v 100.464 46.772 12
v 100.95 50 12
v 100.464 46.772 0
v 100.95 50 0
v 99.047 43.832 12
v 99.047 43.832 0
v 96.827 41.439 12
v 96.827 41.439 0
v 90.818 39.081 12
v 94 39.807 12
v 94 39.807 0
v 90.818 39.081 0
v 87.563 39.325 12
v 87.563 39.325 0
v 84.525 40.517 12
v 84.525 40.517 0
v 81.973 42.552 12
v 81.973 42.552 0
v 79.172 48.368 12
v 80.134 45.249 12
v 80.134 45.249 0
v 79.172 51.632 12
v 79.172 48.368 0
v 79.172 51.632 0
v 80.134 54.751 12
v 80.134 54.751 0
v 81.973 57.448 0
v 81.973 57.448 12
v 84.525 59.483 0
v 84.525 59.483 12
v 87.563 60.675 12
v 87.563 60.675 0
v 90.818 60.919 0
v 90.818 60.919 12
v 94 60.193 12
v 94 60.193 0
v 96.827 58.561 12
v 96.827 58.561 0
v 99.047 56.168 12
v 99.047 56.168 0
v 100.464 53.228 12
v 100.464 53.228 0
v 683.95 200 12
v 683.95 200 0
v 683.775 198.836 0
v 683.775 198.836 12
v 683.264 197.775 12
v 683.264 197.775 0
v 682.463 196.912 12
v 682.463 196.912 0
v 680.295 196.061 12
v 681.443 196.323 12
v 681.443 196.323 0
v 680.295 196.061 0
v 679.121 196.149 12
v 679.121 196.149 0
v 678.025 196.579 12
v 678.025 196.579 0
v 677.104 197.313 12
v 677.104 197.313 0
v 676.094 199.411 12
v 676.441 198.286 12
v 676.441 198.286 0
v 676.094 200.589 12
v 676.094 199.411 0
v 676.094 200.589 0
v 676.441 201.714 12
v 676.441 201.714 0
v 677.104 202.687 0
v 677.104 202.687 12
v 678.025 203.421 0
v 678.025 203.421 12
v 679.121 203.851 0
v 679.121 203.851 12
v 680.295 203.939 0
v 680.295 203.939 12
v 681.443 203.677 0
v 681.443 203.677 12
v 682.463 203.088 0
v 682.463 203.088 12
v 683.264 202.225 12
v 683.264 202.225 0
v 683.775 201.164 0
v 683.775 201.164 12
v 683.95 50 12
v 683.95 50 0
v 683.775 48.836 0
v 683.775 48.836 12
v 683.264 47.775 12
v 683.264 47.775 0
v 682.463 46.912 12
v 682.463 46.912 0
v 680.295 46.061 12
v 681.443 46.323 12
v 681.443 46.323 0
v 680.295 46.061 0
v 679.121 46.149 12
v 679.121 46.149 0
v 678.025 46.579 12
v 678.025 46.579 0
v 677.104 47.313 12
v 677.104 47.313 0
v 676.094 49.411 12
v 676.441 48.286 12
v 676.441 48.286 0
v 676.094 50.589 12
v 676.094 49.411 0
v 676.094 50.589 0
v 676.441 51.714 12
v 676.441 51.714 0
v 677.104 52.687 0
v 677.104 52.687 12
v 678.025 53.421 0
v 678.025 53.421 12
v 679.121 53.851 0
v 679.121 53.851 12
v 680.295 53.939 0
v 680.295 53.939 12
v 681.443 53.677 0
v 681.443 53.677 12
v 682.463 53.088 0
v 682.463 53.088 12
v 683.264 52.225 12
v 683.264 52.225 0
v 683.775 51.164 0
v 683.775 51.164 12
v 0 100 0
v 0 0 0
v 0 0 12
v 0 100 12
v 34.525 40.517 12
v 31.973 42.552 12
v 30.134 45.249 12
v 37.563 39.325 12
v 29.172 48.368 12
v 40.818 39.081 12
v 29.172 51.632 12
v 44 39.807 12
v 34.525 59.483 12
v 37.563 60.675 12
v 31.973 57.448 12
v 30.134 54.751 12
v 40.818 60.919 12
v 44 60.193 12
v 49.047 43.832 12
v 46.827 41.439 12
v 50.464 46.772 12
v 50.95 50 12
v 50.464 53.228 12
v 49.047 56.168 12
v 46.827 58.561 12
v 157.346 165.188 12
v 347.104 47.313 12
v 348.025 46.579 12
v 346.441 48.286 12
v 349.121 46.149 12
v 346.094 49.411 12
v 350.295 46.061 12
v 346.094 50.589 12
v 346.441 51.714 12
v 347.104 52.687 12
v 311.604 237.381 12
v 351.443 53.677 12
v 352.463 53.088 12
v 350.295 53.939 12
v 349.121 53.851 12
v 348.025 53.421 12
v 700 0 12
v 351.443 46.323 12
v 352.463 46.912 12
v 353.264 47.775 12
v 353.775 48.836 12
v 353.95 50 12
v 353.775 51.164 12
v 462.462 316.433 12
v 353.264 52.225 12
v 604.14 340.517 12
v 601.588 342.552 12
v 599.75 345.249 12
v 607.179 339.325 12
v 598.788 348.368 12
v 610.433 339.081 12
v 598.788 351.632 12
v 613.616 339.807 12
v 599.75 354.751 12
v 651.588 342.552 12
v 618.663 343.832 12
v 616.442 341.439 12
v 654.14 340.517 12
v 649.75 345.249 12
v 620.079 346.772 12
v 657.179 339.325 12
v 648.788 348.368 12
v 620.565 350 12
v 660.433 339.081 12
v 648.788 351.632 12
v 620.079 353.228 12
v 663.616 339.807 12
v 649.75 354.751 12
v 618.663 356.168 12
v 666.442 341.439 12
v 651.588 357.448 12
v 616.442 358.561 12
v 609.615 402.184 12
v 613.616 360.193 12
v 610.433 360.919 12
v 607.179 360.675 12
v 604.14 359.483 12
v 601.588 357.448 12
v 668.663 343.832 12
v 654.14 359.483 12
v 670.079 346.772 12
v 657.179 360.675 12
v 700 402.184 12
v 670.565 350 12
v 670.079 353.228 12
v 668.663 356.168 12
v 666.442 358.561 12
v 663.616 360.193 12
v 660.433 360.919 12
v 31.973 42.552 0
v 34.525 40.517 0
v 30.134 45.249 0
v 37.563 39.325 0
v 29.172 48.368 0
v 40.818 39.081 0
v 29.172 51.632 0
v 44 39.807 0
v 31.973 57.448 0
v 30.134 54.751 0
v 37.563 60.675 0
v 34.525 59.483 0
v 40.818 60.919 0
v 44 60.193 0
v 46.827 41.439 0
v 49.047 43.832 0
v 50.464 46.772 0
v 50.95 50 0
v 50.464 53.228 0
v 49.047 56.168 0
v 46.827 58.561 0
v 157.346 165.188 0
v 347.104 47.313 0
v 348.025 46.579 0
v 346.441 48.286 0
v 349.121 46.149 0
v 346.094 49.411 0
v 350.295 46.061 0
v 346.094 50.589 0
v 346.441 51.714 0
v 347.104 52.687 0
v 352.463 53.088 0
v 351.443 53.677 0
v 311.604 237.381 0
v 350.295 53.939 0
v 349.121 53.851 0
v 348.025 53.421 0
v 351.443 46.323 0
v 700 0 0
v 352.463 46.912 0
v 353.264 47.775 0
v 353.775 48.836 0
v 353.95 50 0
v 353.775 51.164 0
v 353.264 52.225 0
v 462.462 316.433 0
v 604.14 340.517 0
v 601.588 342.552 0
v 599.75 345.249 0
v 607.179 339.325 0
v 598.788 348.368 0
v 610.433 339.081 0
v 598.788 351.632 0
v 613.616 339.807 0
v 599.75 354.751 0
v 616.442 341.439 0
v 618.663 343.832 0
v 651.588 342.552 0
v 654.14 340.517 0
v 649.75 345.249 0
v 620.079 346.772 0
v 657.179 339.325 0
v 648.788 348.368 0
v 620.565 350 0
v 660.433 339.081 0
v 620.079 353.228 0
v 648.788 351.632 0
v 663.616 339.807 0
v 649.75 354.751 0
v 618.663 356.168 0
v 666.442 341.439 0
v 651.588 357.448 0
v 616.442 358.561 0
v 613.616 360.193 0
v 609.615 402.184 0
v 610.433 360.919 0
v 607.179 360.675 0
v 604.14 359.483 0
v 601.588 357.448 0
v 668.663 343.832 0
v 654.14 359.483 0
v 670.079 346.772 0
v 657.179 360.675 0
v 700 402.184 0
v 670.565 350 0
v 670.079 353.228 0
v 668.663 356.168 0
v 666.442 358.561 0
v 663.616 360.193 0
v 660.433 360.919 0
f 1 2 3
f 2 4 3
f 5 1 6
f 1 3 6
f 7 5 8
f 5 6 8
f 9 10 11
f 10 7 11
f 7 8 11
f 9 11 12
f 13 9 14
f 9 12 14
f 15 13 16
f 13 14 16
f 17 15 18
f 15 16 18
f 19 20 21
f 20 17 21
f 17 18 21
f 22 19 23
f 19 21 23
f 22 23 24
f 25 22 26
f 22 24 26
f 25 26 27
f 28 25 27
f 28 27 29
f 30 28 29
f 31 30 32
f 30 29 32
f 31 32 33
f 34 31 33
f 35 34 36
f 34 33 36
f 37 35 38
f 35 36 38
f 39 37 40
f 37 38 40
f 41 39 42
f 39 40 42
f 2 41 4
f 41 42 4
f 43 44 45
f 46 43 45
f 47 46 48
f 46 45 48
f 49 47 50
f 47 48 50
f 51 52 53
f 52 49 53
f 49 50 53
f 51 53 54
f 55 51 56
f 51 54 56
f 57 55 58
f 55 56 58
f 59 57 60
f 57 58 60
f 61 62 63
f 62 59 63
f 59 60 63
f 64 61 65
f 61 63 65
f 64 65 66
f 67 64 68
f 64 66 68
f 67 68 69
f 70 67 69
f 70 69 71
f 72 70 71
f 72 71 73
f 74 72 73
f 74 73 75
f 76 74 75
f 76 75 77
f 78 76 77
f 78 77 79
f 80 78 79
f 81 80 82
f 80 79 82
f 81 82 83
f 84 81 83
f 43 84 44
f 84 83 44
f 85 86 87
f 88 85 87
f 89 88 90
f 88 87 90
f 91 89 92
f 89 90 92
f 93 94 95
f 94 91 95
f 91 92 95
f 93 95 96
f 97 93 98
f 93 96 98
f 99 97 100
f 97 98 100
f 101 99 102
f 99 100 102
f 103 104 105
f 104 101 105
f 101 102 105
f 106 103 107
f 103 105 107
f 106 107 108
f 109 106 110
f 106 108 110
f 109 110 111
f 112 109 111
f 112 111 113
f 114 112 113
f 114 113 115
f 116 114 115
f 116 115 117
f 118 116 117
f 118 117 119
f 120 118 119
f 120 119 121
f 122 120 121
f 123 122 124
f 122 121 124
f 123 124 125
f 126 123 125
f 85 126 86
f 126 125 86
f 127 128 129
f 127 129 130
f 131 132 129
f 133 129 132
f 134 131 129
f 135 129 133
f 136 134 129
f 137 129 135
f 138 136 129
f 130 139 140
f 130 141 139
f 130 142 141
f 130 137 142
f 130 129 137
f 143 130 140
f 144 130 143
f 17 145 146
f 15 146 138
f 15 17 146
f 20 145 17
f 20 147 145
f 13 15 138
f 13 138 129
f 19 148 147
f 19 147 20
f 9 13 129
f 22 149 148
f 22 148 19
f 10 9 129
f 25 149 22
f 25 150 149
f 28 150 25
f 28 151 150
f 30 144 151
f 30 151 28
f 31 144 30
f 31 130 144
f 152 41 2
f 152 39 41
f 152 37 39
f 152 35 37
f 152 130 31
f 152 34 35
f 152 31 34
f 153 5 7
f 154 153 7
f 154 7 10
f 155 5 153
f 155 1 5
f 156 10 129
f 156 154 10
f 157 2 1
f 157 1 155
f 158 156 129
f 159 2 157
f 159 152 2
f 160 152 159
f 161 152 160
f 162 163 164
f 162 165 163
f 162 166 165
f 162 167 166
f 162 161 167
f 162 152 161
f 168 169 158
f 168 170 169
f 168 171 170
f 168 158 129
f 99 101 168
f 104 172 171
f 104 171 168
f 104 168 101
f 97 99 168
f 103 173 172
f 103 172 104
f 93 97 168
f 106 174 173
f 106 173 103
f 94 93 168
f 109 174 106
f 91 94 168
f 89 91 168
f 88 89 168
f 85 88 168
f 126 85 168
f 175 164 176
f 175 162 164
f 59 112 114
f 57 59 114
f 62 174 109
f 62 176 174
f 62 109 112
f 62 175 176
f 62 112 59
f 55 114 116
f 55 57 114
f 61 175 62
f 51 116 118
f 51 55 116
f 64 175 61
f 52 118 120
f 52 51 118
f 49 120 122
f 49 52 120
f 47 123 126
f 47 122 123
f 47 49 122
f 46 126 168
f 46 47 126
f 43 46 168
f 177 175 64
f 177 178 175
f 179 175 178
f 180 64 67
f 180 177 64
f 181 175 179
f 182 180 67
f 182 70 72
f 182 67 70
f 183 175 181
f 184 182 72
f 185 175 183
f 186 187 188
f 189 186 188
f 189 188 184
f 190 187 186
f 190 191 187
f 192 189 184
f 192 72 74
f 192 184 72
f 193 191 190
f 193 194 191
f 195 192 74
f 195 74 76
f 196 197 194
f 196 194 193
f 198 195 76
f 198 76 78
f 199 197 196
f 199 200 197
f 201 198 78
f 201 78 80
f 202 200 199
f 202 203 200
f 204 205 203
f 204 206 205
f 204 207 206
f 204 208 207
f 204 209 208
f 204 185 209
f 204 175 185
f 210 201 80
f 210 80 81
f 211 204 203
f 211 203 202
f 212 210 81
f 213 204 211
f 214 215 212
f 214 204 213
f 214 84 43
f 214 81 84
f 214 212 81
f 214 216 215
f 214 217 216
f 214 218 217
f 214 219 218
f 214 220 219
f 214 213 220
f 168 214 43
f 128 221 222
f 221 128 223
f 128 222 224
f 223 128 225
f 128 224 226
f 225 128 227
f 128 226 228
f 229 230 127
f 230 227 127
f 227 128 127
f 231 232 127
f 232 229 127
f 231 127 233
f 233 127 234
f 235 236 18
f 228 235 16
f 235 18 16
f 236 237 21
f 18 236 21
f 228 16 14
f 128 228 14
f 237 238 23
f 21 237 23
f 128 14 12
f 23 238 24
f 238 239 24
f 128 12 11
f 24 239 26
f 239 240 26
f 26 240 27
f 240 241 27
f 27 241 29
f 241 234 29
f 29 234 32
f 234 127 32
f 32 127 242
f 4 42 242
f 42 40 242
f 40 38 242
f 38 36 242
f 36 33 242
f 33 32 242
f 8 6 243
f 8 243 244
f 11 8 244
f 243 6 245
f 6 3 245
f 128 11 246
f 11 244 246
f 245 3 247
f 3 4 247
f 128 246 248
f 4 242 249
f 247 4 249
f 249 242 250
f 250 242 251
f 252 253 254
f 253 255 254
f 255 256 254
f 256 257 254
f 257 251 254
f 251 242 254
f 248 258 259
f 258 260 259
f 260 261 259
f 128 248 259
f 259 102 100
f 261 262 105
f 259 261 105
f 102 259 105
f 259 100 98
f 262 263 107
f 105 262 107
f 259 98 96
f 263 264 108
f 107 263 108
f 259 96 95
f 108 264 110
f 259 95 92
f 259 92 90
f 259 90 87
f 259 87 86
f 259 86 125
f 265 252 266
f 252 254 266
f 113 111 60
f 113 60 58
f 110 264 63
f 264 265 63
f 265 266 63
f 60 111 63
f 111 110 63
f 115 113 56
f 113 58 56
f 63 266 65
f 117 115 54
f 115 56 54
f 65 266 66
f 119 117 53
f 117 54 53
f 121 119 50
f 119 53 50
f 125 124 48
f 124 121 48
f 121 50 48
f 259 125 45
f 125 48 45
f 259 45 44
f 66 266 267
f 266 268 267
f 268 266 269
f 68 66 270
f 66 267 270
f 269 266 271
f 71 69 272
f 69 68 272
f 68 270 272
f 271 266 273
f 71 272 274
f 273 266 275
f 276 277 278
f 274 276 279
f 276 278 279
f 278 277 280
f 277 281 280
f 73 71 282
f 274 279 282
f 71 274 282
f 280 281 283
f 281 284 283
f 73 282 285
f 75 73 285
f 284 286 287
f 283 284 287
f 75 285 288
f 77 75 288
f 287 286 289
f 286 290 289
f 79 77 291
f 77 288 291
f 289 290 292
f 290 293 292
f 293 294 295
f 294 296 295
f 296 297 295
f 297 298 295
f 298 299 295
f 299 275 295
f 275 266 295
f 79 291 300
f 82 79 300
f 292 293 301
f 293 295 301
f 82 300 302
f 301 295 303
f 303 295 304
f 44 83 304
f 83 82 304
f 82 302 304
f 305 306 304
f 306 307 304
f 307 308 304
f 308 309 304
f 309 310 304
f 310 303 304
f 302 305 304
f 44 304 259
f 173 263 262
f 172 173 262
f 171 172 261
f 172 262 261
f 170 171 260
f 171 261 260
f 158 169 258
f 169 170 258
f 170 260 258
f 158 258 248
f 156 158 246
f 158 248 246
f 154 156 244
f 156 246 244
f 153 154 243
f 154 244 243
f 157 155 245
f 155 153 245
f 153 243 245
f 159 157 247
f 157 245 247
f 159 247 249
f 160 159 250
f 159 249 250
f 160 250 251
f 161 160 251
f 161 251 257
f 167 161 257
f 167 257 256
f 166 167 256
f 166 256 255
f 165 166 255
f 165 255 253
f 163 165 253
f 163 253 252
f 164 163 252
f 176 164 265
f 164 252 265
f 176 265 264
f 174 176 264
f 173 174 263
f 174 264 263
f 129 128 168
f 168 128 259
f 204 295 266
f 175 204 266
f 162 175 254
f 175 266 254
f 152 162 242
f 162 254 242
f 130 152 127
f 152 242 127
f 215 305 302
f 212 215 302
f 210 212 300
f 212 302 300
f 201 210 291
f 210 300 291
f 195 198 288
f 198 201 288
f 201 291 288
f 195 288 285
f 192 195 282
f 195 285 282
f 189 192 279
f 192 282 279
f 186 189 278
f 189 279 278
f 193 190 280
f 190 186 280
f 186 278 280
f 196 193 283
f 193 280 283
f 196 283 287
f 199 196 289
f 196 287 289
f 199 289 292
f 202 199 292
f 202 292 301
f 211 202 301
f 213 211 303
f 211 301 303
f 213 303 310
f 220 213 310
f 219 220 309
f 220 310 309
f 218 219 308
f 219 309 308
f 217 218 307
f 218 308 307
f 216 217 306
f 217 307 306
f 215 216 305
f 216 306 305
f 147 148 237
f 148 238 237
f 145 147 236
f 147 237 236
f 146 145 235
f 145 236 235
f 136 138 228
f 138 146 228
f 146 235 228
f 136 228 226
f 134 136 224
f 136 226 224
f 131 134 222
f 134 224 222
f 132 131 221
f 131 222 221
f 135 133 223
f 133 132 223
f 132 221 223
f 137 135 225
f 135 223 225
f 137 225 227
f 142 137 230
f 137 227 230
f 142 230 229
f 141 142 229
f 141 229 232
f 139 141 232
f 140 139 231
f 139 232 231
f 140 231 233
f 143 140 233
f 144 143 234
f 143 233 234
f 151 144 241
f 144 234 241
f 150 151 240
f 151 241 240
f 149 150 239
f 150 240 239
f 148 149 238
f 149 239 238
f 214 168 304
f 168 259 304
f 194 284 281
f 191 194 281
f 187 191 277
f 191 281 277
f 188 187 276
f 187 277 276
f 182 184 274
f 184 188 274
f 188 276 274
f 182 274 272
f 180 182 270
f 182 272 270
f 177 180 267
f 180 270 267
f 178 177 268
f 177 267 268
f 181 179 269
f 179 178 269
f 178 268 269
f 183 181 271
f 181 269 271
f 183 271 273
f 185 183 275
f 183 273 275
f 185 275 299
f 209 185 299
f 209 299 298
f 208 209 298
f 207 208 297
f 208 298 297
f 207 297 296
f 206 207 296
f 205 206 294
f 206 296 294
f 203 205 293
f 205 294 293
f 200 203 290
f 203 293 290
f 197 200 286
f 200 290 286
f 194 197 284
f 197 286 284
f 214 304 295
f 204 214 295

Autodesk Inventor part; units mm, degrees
ref_plane "YZ Plane" through (0, 0, 0) normal (1, 0, 0) x (0, 1, 0)
ref_plane "XZ Plane" through (0, 0, 0) normal (0, 1, 0) x (-1, 0, 0)
ref_plane "XY Plane" through (0, 0, 0) normal (0, 0, 1) x (1, 0, 0)
sketch "Sketch1" plane through (0, 0, 0) normal (0, 0, 1) x (1, 0, 0)
  line L0 (0, 0) -> (700, 0)
  line L1 (0, 0) -> (0, 100)
  circle A0 centre (40, 50) radius 10.95
  circle A1 centre (90, 50) radius 10.95
  circle A2 centre (609.6152, 350) radius 10.95
  circle A3 centre (659.6152, 350) radius 10.95
  line L2 (700, 0) -> (700, 402.1837)
  line L3 (700, 402.1837) -> (609.6152, 402.1837)
  arc A4 (0, 100) -> (609.6152, 402.1837) centre (-1371.2256, 3632.2653) ccw
  circle A5 centre (350, 50) radius 3.95
  circle A6 centre (680, 50) radius 3.95
  circle A7 centre (680, 200) radius 3.95
  dimension "d0" = 700
  dimension "d1" = 100
  dimension "d3" = 21.9
  dimension "d5" = 21.9
  dimension "d9" = 21.9
  dimension "d10" = 21.9
  dimension "d14" = 7.9
  dimension "d17" = 7.9
  dimension "d18" = 7.9
extrude "Plate1" add sketch "Sketch1" along normal blind 12
equation "\"d19\" = Thickness"
equation "\"BendRadius\" = Thickness"
equation "\"BendReliefWidth\" = Thickness"
equation "\"BendReliefDepth\" = 0.5 * Thickness"
equation "\"CornerReliefSize\" = 4 * Thickness"
equation "\"MinimumRemnant\" = 2 * Thickness"
equation "\"TransitionRadius\" = BendRadius"
equation "\"JacobiRadiusSize\" = BendRadius"
equation "\"GapSize\" = Thickness"
equation "\"Thickness\" = 12"
properties part number "Laser Print For Left Frame with support"
